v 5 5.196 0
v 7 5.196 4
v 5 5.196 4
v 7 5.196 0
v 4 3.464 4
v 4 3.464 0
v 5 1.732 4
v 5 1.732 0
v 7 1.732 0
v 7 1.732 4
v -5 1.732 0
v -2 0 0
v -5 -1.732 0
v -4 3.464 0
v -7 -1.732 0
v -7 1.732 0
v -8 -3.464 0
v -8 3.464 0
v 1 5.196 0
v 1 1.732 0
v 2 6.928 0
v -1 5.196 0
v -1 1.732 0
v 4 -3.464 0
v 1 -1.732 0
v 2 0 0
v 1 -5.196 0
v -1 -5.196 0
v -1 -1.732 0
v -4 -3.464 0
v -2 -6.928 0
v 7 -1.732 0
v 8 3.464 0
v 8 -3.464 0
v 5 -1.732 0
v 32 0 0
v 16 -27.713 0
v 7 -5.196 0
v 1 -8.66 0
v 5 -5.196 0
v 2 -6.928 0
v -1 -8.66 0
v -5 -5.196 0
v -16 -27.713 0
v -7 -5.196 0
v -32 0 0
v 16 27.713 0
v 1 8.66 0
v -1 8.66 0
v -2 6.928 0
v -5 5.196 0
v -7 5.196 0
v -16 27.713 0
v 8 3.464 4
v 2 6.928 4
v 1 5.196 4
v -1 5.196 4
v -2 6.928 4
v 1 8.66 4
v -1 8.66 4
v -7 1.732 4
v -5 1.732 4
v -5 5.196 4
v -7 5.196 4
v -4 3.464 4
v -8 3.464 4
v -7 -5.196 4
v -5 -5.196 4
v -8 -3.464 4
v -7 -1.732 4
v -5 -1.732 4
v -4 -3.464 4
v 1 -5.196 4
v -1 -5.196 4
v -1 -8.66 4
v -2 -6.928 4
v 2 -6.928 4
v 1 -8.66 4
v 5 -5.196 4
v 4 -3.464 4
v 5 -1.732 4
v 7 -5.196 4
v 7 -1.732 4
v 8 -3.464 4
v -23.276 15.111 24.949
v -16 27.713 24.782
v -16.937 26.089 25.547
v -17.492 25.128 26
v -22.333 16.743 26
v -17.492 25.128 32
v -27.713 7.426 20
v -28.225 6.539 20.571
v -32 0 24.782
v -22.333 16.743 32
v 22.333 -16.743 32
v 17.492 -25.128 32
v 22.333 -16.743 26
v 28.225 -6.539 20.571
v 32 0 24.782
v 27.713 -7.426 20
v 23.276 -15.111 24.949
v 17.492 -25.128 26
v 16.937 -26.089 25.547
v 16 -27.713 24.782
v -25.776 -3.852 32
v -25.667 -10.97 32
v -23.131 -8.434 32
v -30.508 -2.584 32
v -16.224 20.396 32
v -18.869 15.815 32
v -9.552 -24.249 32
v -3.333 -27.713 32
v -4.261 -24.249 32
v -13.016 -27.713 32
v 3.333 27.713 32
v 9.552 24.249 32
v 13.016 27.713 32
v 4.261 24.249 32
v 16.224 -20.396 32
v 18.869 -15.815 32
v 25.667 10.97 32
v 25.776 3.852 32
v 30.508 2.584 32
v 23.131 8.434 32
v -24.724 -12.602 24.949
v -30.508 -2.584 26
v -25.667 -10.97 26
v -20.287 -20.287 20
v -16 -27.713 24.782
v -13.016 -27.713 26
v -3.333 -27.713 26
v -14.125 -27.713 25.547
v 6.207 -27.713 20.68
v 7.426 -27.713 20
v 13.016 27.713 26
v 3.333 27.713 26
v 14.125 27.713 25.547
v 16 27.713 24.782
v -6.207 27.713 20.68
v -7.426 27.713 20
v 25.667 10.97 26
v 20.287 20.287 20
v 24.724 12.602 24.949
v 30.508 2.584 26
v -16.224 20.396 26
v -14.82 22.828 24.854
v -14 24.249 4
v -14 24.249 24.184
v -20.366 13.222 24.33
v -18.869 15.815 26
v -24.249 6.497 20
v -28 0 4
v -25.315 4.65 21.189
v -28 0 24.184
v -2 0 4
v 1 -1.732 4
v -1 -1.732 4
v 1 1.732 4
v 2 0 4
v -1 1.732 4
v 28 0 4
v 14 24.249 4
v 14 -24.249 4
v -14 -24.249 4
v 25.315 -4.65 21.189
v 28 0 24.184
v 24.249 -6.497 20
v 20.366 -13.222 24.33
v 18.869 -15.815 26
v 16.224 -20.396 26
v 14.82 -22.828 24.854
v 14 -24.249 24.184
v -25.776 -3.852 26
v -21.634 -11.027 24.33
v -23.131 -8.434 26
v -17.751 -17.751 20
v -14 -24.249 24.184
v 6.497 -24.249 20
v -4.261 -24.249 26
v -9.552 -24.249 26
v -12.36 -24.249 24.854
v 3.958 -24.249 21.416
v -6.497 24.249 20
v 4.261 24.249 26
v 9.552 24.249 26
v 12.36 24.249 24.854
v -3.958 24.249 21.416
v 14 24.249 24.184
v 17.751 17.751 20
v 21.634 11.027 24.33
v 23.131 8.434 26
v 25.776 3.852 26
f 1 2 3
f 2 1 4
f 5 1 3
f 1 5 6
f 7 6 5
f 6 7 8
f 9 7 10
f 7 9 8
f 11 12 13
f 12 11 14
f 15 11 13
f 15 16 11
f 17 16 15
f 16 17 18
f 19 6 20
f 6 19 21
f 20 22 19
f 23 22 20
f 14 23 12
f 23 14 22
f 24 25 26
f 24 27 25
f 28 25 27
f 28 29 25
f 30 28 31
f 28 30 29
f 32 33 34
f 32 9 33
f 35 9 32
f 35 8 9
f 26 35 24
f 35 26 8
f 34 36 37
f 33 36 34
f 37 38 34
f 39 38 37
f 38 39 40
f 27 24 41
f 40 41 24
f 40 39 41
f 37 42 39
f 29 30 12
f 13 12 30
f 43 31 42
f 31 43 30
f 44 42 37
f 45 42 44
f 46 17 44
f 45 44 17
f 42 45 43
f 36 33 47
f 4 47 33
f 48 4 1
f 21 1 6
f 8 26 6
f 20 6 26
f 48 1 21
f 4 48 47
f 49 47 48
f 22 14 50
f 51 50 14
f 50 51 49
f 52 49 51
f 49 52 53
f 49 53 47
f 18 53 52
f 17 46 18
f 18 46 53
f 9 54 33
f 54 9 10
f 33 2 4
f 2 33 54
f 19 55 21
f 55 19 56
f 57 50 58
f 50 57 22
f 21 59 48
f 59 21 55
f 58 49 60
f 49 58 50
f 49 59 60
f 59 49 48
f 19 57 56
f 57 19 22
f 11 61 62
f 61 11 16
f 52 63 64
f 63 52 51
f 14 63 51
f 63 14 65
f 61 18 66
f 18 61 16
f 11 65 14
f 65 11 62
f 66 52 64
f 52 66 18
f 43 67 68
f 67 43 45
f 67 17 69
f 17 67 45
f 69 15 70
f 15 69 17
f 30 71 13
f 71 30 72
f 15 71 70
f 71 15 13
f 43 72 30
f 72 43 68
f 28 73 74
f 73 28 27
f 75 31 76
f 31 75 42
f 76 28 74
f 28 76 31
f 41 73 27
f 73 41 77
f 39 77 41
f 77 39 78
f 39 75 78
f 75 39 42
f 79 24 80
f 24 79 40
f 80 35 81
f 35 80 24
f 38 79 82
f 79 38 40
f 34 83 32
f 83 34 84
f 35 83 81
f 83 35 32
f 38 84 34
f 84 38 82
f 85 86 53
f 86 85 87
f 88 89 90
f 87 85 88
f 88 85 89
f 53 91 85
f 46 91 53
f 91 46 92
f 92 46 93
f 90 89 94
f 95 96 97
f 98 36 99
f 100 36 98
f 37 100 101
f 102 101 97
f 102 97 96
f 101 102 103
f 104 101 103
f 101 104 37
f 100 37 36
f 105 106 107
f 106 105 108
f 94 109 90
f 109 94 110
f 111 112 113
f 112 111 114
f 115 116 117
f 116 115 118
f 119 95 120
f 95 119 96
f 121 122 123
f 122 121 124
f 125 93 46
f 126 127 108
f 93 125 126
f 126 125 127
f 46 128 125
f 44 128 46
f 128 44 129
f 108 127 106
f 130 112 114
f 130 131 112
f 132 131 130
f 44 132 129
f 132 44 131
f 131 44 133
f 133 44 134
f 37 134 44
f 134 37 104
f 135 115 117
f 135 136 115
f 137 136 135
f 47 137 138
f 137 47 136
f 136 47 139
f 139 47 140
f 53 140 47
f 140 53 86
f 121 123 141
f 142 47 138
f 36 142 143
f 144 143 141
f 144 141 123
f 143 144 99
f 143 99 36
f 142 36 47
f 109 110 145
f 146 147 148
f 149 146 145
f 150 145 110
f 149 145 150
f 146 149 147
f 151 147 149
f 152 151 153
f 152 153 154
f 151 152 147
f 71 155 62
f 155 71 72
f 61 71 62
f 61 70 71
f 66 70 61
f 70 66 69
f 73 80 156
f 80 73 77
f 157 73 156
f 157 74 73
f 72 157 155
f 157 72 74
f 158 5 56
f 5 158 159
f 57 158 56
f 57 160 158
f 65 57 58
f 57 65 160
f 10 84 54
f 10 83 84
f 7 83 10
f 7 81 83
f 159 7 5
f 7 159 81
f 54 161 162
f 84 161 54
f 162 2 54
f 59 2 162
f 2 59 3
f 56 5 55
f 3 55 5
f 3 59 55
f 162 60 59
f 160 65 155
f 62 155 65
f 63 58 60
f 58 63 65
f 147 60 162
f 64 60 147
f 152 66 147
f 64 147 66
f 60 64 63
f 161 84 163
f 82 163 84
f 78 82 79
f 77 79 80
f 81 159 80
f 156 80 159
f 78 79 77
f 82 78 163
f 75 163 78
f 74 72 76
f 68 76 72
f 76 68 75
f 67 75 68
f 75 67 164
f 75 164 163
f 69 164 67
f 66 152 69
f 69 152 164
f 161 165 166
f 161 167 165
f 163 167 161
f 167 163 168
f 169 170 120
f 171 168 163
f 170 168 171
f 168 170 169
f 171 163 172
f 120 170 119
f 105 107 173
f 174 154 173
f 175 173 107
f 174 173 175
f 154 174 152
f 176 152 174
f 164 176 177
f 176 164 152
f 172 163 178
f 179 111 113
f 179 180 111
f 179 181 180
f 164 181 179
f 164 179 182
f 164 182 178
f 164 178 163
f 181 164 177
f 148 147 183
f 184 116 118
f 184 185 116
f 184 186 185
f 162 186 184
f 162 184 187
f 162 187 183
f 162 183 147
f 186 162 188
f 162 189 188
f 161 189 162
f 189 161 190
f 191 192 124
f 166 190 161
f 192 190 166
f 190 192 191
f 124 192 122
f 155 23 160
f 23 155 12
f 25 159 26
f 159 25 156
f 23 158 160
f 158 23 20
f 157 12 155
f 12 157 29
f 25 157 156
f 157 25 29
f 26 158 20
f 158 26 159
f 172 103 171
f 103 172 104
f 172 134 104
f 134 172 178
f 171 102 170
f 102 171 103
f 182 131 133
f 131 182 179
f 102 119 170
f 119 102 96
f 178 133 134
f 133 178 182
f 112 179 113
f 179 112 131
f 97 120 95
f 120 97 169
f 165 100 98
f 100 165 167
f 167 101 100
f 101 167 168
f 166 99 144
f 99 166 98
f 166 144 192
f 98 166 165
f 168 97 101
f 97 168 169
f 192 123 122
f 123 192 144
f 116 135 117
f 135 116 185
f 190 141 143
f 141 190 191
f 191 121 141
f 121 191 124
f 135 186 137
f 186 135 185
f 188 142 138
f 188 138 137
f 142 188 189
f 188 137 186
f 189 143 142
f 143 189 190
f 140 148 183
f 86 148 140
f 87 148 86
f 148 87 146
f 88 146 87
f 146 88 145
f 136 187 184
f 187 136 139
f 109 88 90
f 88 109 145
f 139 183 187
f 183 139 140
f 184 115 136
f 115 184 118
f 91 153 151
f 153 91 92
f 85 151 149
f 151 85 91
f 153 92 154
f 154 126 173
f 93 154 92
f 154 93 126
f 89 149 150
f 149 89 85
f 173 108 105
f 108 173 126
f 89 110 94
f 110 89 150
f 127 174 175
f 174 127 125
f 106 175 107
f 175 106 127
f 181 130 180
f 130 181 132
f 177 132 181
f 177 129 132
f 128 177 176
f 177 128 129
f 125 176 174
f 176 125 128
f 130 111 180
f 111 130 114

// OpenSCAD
// file: planter_base.scad
module planter_base() {
    difference() {
        linear_extrude(32) circle(32, $fn=6);
        translate([0, 0, 4]) linear_extrude(32) circle(28, $fn = 6);
        linear_extrude(8) circle(2, $fn = 6);
        for (i = [0:60:300]) {
            linear_extrude(8) rotate(i) translate([6, cos(30)*4]) circle(2, $fn = 6);
        }
    }
}
// main file
include <planter_base.scad>;

module planter_02() {
    difference() {
        planter_base();
        for (i=[0:60:300]) {
            rotate(i+15) translate([0, 0, 32]) rotate(90, [1, 0, 0]) rotate(30, [0, 0, 1]) cylinder(32, r = 12, $fn = 6);
        }
    }
}

if (is_undef($demo)) {
    planter_02();
}
